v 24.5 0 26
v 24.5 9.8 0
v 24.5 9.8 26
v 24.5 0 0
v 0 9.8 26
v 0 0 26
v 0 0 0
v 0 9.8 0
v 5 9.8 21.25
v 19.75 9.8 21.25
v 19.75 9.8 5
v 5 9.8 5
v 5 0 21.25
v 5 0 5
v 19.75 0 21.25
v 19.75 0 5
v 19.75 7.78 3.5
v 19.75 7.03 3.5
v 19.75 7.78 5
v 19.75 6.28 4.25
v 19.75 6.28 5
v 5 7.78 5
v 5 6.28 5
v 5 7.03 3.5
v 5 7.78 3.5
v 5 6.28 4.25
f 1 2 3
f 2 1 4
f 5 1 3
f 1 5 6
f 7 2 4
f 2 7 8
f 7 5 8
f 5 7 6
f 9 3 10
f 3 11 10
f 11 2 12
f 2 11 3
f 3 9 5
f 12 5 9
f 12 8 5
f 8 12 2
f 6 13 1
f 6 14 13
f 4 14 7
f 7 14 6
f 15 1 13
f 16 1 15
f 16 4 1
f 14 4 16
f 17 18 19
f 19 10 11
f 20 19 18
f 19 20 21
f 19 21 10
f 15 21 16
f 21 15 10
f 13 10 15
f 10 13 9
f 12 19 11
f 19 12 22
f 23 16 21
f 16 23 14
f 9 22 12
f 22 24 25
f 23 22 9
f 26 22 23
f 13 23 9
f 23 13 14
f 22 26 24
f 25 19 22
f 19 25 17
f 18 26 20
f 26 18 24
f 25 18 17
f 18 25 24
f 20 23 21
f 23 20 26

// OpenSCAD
// file: keystone.scad
// all dimensions are in millimeters

// major dimension for keystone hole, width
keystone_width = 14.5;
// major dimension for keystone hole, height
keystone_height = 16;

// clearance around hole
boss_clearance = 0.25;
// margin aroudn keystone hole
boss_margin = 5;
boss_inner_width = keystone_width + boss_clearance;
boss_inner_height = keystone_height + boss_clearance;
boss_outer_width = keystone_width + boss_margin * 2;
boss_outer_height = keystone_height + boss_margin * 2;
// depth of the solid frame around the keystone hole
boss_depth = 9.8;

// major dimension of fixed tab as viewed from side of connector (square with a corner cut off)
fixed_tab_size = 1.5;
fixed_tab_depth_from_panel_face = 6.28;

module boss() {
    module basic_frame() {
        color([1, 1, 1])
            difference() {
                cube([boss_outer_width, boss_depth, boss_outer_height]);
                translate([boss_margin, 0, boss_margin])
                    cube([boss_inner_width, boss_depth, boss_inner_height]);
            }
    }

    module clearance_for_fixed_tab() {
        translate([boss_margin, fixed_tab_depth_from_panel_face, boss_margin])
        rotate([0, 90, 0])
        linear_extrude(height=boss_inner_width)
        // polygon drawn as viewed from side of keystone connector (triangular-ish face)
        polygon(points=[[0, 0], [0, fixed_tab_size], [fixed_tab_size, fixed_tab_size], [fixed_tab_size, fixed_tab_size / 2], [fixed_tab_size / 2, 0]]);
    }

    module clearances() {
        clearance_for_fixed_tab();
    }

    difference() {
        basic_frame();
        clearances();
    }
}

module keystone() {
    boss();
}

keystone();
// main file
use <keystone.scad>;

number_of_keystones = 1;
space_between_keystones = 23;

module panel() {
    for (i = [0 : number_of_keystones - 1]) {
        translate([0, i * space_between_keystones, 0])
            keystone();
    }
}

module frame() {
    difference() {
        difference() {
            translate([0, 0, - 50])
                cube([30.5, 24.91671 * number_of_keystones, 50]);
            translate([2.5, 2.5, - 50])
                cube([25, (24.91671 * number_of_keystones) - 4, 50]);
        }
        translate([-10, 2.5, -40])
            cube([25, 295, 40]);
    }
}

panel();
//frame();
